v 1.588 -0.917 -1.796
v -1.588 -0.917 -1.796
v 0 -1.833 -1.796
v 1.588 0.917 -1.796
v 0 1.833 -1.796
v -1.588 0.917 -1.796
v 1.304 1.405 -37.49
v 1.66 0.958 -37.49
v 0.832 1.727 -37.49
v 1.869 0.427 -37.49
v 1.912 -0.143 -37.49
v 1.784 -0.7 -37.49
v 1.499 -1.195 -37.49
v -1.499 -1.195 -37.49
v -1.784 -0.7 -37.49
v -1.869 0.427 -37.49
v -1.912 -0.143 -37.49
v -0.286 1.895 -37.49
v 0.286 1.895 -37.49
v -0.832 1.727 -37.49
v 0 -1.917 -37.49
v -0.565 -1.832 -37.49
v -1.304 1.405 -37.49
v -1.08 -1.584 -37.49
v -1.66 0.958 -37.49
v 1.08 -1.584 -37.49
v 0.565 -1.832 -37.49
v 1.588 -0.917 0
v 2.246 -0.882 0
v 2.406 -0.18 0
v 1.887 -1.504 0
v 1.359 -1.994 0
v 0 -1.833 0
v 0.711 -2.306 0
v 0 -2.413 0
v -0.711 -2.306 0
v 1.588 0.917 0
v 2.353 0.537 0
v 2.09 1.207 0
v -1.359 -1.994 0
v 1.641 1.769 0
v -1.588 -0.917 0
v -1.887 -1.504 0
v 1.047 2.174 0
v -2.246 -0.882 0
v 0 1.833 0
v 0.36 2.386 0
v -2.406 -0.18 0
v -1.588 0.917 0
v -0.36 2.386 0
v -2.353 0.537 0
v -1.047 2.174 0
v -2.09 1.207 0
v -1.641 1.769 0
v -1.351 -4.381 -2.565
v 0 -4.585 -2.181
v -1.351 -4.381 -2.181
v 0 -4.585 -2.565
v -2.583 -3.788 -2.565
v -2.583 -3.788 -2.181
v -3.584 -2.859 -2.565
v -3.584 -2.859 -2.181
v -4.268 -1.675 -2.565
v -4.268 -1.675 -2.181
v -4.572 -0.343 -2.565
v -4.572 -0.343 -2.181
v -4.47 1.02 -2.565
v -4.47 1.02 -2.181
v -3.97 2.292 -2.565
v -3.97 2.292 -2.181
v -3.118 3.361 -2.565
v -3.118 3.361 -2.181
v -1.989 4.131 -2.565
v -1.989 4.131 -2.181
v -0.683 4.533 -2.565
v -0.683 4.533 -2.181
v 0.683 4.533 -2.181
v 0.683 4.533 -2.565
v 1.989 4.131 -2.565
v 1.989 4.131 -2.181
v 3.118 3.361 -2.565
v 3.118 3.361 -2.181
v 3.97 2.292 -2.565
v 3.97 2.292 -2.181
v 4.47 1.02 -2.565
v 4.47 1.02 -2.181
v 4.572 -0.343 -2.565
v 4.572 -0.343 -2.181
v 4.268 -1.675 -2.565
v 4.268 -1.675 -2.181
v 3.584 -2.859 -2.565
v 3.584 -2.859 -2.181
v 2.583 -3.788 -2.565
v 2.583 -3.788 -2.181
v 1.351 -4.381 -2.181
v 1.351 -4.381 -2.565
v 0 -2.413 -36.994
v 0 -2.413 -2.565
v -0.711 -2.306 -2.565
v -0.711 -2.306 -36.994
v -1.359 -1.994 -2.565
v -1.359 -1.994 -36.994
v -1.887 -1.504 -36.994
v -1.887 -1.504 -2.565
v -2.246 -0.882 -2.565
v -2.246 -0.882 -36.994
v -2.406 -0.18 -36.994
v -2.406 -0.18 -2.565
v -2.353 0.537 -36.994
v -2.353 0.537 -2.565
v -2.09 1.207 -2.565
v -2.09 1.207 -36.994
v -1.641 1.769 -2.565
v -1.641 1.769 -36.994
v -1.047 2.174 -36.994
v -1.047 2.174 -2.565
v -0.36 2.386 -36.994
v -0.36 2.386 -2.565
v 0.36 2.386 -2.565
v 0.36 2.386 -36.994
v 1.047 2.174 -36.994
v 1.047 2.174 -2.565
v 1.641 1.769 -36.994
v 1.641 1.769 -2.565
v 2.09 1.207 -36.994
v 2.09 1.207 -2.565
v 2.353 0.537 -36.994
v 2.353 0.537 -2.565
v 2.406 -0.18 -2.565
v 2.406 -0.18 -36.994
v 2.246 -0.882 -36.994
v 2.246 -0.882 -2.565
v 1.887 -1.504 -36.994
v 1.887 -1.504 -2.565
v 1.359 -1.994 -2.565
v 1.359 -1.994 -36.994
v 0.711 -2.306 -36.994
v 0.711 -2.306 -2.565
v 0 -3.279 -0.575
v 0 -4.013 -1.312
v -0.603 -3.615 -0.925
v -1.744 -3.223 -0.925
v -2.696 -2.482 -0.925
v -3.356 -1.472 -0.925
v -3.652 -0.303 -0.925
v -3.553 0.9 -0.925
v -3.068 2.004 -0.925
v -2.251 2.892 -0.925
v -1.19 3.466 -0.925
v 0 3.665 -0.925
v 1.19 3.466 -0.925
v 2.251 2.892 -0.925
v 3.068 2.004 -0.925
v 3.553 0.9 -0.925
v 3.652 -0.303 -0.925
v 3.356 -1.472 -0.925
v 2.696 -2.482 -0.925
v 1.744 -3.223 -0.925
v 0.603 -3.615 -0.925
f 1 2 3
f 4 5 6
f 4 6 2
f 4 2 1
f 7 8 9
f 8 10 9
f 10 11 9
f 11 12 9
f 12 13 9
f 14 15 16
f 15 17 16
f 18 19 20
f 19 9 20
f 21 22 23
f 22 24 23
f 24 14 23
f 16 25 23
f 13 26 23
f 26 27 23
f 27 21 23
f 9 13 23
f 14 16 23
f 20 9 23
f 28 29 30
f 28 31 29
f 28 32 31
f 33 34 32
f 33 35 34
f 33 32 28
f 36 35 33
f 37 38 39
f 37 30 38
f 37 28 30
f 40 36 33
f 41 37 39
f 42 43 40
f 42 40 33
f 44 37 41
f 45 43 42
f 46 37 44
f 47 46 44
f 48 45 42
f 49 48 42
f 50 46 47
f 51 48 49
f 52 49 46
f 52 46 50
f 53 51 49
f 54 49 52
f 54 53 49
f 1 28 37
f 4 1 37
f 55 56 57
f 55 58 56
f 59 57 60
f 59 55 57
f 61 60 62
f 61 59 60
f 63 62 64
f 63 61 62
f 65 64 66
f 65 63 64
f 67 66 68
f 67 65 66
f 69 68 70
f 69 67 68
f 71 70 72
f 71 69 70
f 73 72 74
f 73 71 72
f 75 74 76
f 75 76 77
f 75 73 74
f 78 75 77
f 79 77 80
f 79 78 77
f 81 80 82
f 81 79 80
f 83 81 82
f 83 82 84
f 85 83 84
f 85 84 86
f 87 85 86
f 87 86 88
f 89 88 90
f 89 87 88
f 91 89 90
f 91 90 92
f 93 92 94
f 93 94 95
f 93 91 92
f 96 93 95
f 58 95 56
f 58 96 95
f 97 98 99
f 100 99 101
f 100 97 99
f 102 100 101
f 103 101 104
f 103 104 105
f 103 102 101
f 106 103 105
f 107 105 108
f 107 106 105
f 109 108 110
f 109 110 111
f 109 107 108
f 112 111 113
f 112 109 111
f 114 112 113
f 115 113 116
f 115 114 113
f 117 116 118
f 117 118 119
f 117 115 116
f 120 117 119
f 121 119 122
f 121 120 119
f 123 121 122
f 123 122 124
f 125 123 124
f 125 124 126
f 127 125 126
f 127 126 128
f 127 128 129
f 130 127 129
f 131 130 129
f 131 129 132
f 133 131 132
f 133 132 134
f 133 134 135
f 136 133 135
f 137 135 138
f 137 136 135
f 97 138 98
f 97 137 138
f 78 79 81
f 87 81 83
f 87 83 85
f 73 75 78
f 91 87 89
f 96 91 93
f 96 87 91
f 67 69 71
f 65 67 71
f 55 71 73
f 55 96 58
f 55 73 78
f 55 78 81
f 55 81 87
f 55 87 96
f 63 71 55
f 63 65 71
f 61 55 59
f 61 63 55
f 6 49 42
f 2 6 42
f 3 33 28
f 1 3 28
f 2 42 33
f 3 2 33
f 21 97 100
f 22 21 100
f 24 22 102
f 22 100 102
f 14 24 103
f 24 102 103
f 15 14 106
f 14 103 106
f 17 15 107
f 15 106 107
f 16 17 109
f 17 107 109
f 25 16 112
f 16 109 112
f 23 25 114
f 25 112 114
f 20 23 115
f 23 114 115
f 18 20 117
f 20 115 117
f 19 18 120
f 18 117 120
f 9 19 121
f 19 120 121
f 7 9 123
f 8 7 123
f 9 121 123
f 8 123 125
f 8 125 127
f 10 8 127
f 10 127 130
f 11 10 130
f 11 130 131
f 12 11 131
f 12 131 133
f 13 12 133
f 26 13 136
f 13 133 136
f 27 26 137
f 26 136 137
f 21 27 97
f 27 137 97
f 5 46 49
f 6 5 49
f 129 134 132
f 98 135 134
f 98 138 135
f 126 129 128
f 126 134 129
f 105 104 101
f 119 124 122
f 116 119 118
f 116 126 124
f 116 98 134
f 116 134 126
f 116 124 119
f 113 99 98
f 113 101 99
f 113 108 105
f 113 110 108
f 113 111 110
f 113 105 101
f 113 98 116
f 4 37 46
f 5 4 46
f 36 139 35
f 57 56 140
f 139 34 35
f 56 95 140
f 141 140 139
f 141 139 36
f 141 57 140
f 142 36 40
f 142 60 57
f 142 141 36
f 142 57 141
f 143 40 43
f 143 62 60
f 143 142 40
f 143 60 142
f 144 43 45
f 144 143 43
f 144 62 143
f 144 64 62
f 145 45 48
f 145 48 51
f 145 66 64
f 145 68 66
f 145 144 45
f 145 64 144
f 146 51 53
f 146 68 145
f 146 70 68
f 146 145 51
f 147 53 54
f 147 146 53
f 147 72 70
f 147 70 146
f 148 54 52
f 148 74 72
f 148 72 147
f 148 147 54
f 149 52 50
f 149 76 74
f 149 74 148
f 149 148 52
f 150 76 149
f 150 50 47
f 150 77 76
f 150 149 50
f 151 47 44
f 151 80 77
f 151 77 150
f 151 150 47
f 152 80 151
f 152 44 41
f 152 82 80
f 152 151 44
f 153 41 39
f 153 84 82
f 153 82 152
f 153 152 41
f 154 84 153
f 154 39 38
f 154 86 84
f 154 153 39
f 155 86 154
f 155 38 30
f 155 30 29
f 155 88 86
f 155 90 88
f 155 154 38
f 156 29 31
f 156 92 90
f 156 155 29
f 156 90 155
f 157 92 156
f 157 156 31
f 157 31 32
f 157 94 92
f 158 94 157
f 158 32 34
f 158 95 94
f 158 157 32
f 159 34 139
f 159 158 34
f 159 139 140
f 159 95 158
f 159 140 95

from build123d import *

# Parameters (mm, degrees)
SKETCH11_W         = 34.925
SKETCH11_H         = 2.413
CHAMFER1_SIZE      = 0.49609375
CUT_EXTRUDE2_DEPTH = 1.79578


with BuildPart() as part:
    # Sketch11 → Revolve1 (revolve)
    with BuildSketch(Plane(origin=(0, 0, 0), x_dir=(0, 0, -1), z_dir=(1, 0, 0)), mode=Mode.PRIVATE) as revolve1_sk:
        with Locations((20.0279, 1.2065)):
            Rectangle(SKETCH11_W, SKETCH11_H)
    revolve(revolve1_sk.sketch.rotate(Axis((0, 0, -2.5654), (0, 0, -1)), 180), axis=Axis((0, 0, -2.5654), (0, 0, -1)))

    # Chamfer1
    chamfer1_edges = [part.edges().sort_by_distance(p)[0] for p in [
        (0, 2.413, -37.4904),
    ]]
    chamfer(chamfer1_edges, length=CHAMFER1_SIZE)


with BuildPart() as body_2:
    # Sketch7 → Revolve2 (revolve)
    with BuildSketch(Plane(origin=(0, 0, 0), x_dir=(0, 0, -1), z_dir=(1, 0, 0)), mode=Mode.PRIVATE) as revolve2_sk:
        with BuildLine():
            Line((2.18059, 4.5847), (2.5654, 4.5847))
            Line((2.5654, 4.5847), (2.5654, 0))
            Line((2.5654, 0), (0, 0))
            Line((0, 0), (0, 2.413))
            ThreePointArc((0, 2.413), (0.925030326, 3.664791196), (2.18059, 4.5847))
        make_face()
    revolve(revolve2_sk.sketch.rotate(Axis((0, 0, 0), (0, 0, -1)), 180), axis=Axis((0, 0, 0), (0, 0, -1)))

    # Sketch5 → Cut-Extrude2 (cut)
    with BuildSketch(Plane.XY):
        Polygon((1.5875, -0.916543552), (1.5875, 0.916543552), (0, 1.833087105), (-1.5875, 0.916543552), (-1.5875, -0.916543552), (0, -1.833087105), align=None)
    extrude(amount=-CUT_EXTRUDE2_DEPTH, mode=Mode.SUBTRACT)


solid = Compound([part.part, body_2.part])
